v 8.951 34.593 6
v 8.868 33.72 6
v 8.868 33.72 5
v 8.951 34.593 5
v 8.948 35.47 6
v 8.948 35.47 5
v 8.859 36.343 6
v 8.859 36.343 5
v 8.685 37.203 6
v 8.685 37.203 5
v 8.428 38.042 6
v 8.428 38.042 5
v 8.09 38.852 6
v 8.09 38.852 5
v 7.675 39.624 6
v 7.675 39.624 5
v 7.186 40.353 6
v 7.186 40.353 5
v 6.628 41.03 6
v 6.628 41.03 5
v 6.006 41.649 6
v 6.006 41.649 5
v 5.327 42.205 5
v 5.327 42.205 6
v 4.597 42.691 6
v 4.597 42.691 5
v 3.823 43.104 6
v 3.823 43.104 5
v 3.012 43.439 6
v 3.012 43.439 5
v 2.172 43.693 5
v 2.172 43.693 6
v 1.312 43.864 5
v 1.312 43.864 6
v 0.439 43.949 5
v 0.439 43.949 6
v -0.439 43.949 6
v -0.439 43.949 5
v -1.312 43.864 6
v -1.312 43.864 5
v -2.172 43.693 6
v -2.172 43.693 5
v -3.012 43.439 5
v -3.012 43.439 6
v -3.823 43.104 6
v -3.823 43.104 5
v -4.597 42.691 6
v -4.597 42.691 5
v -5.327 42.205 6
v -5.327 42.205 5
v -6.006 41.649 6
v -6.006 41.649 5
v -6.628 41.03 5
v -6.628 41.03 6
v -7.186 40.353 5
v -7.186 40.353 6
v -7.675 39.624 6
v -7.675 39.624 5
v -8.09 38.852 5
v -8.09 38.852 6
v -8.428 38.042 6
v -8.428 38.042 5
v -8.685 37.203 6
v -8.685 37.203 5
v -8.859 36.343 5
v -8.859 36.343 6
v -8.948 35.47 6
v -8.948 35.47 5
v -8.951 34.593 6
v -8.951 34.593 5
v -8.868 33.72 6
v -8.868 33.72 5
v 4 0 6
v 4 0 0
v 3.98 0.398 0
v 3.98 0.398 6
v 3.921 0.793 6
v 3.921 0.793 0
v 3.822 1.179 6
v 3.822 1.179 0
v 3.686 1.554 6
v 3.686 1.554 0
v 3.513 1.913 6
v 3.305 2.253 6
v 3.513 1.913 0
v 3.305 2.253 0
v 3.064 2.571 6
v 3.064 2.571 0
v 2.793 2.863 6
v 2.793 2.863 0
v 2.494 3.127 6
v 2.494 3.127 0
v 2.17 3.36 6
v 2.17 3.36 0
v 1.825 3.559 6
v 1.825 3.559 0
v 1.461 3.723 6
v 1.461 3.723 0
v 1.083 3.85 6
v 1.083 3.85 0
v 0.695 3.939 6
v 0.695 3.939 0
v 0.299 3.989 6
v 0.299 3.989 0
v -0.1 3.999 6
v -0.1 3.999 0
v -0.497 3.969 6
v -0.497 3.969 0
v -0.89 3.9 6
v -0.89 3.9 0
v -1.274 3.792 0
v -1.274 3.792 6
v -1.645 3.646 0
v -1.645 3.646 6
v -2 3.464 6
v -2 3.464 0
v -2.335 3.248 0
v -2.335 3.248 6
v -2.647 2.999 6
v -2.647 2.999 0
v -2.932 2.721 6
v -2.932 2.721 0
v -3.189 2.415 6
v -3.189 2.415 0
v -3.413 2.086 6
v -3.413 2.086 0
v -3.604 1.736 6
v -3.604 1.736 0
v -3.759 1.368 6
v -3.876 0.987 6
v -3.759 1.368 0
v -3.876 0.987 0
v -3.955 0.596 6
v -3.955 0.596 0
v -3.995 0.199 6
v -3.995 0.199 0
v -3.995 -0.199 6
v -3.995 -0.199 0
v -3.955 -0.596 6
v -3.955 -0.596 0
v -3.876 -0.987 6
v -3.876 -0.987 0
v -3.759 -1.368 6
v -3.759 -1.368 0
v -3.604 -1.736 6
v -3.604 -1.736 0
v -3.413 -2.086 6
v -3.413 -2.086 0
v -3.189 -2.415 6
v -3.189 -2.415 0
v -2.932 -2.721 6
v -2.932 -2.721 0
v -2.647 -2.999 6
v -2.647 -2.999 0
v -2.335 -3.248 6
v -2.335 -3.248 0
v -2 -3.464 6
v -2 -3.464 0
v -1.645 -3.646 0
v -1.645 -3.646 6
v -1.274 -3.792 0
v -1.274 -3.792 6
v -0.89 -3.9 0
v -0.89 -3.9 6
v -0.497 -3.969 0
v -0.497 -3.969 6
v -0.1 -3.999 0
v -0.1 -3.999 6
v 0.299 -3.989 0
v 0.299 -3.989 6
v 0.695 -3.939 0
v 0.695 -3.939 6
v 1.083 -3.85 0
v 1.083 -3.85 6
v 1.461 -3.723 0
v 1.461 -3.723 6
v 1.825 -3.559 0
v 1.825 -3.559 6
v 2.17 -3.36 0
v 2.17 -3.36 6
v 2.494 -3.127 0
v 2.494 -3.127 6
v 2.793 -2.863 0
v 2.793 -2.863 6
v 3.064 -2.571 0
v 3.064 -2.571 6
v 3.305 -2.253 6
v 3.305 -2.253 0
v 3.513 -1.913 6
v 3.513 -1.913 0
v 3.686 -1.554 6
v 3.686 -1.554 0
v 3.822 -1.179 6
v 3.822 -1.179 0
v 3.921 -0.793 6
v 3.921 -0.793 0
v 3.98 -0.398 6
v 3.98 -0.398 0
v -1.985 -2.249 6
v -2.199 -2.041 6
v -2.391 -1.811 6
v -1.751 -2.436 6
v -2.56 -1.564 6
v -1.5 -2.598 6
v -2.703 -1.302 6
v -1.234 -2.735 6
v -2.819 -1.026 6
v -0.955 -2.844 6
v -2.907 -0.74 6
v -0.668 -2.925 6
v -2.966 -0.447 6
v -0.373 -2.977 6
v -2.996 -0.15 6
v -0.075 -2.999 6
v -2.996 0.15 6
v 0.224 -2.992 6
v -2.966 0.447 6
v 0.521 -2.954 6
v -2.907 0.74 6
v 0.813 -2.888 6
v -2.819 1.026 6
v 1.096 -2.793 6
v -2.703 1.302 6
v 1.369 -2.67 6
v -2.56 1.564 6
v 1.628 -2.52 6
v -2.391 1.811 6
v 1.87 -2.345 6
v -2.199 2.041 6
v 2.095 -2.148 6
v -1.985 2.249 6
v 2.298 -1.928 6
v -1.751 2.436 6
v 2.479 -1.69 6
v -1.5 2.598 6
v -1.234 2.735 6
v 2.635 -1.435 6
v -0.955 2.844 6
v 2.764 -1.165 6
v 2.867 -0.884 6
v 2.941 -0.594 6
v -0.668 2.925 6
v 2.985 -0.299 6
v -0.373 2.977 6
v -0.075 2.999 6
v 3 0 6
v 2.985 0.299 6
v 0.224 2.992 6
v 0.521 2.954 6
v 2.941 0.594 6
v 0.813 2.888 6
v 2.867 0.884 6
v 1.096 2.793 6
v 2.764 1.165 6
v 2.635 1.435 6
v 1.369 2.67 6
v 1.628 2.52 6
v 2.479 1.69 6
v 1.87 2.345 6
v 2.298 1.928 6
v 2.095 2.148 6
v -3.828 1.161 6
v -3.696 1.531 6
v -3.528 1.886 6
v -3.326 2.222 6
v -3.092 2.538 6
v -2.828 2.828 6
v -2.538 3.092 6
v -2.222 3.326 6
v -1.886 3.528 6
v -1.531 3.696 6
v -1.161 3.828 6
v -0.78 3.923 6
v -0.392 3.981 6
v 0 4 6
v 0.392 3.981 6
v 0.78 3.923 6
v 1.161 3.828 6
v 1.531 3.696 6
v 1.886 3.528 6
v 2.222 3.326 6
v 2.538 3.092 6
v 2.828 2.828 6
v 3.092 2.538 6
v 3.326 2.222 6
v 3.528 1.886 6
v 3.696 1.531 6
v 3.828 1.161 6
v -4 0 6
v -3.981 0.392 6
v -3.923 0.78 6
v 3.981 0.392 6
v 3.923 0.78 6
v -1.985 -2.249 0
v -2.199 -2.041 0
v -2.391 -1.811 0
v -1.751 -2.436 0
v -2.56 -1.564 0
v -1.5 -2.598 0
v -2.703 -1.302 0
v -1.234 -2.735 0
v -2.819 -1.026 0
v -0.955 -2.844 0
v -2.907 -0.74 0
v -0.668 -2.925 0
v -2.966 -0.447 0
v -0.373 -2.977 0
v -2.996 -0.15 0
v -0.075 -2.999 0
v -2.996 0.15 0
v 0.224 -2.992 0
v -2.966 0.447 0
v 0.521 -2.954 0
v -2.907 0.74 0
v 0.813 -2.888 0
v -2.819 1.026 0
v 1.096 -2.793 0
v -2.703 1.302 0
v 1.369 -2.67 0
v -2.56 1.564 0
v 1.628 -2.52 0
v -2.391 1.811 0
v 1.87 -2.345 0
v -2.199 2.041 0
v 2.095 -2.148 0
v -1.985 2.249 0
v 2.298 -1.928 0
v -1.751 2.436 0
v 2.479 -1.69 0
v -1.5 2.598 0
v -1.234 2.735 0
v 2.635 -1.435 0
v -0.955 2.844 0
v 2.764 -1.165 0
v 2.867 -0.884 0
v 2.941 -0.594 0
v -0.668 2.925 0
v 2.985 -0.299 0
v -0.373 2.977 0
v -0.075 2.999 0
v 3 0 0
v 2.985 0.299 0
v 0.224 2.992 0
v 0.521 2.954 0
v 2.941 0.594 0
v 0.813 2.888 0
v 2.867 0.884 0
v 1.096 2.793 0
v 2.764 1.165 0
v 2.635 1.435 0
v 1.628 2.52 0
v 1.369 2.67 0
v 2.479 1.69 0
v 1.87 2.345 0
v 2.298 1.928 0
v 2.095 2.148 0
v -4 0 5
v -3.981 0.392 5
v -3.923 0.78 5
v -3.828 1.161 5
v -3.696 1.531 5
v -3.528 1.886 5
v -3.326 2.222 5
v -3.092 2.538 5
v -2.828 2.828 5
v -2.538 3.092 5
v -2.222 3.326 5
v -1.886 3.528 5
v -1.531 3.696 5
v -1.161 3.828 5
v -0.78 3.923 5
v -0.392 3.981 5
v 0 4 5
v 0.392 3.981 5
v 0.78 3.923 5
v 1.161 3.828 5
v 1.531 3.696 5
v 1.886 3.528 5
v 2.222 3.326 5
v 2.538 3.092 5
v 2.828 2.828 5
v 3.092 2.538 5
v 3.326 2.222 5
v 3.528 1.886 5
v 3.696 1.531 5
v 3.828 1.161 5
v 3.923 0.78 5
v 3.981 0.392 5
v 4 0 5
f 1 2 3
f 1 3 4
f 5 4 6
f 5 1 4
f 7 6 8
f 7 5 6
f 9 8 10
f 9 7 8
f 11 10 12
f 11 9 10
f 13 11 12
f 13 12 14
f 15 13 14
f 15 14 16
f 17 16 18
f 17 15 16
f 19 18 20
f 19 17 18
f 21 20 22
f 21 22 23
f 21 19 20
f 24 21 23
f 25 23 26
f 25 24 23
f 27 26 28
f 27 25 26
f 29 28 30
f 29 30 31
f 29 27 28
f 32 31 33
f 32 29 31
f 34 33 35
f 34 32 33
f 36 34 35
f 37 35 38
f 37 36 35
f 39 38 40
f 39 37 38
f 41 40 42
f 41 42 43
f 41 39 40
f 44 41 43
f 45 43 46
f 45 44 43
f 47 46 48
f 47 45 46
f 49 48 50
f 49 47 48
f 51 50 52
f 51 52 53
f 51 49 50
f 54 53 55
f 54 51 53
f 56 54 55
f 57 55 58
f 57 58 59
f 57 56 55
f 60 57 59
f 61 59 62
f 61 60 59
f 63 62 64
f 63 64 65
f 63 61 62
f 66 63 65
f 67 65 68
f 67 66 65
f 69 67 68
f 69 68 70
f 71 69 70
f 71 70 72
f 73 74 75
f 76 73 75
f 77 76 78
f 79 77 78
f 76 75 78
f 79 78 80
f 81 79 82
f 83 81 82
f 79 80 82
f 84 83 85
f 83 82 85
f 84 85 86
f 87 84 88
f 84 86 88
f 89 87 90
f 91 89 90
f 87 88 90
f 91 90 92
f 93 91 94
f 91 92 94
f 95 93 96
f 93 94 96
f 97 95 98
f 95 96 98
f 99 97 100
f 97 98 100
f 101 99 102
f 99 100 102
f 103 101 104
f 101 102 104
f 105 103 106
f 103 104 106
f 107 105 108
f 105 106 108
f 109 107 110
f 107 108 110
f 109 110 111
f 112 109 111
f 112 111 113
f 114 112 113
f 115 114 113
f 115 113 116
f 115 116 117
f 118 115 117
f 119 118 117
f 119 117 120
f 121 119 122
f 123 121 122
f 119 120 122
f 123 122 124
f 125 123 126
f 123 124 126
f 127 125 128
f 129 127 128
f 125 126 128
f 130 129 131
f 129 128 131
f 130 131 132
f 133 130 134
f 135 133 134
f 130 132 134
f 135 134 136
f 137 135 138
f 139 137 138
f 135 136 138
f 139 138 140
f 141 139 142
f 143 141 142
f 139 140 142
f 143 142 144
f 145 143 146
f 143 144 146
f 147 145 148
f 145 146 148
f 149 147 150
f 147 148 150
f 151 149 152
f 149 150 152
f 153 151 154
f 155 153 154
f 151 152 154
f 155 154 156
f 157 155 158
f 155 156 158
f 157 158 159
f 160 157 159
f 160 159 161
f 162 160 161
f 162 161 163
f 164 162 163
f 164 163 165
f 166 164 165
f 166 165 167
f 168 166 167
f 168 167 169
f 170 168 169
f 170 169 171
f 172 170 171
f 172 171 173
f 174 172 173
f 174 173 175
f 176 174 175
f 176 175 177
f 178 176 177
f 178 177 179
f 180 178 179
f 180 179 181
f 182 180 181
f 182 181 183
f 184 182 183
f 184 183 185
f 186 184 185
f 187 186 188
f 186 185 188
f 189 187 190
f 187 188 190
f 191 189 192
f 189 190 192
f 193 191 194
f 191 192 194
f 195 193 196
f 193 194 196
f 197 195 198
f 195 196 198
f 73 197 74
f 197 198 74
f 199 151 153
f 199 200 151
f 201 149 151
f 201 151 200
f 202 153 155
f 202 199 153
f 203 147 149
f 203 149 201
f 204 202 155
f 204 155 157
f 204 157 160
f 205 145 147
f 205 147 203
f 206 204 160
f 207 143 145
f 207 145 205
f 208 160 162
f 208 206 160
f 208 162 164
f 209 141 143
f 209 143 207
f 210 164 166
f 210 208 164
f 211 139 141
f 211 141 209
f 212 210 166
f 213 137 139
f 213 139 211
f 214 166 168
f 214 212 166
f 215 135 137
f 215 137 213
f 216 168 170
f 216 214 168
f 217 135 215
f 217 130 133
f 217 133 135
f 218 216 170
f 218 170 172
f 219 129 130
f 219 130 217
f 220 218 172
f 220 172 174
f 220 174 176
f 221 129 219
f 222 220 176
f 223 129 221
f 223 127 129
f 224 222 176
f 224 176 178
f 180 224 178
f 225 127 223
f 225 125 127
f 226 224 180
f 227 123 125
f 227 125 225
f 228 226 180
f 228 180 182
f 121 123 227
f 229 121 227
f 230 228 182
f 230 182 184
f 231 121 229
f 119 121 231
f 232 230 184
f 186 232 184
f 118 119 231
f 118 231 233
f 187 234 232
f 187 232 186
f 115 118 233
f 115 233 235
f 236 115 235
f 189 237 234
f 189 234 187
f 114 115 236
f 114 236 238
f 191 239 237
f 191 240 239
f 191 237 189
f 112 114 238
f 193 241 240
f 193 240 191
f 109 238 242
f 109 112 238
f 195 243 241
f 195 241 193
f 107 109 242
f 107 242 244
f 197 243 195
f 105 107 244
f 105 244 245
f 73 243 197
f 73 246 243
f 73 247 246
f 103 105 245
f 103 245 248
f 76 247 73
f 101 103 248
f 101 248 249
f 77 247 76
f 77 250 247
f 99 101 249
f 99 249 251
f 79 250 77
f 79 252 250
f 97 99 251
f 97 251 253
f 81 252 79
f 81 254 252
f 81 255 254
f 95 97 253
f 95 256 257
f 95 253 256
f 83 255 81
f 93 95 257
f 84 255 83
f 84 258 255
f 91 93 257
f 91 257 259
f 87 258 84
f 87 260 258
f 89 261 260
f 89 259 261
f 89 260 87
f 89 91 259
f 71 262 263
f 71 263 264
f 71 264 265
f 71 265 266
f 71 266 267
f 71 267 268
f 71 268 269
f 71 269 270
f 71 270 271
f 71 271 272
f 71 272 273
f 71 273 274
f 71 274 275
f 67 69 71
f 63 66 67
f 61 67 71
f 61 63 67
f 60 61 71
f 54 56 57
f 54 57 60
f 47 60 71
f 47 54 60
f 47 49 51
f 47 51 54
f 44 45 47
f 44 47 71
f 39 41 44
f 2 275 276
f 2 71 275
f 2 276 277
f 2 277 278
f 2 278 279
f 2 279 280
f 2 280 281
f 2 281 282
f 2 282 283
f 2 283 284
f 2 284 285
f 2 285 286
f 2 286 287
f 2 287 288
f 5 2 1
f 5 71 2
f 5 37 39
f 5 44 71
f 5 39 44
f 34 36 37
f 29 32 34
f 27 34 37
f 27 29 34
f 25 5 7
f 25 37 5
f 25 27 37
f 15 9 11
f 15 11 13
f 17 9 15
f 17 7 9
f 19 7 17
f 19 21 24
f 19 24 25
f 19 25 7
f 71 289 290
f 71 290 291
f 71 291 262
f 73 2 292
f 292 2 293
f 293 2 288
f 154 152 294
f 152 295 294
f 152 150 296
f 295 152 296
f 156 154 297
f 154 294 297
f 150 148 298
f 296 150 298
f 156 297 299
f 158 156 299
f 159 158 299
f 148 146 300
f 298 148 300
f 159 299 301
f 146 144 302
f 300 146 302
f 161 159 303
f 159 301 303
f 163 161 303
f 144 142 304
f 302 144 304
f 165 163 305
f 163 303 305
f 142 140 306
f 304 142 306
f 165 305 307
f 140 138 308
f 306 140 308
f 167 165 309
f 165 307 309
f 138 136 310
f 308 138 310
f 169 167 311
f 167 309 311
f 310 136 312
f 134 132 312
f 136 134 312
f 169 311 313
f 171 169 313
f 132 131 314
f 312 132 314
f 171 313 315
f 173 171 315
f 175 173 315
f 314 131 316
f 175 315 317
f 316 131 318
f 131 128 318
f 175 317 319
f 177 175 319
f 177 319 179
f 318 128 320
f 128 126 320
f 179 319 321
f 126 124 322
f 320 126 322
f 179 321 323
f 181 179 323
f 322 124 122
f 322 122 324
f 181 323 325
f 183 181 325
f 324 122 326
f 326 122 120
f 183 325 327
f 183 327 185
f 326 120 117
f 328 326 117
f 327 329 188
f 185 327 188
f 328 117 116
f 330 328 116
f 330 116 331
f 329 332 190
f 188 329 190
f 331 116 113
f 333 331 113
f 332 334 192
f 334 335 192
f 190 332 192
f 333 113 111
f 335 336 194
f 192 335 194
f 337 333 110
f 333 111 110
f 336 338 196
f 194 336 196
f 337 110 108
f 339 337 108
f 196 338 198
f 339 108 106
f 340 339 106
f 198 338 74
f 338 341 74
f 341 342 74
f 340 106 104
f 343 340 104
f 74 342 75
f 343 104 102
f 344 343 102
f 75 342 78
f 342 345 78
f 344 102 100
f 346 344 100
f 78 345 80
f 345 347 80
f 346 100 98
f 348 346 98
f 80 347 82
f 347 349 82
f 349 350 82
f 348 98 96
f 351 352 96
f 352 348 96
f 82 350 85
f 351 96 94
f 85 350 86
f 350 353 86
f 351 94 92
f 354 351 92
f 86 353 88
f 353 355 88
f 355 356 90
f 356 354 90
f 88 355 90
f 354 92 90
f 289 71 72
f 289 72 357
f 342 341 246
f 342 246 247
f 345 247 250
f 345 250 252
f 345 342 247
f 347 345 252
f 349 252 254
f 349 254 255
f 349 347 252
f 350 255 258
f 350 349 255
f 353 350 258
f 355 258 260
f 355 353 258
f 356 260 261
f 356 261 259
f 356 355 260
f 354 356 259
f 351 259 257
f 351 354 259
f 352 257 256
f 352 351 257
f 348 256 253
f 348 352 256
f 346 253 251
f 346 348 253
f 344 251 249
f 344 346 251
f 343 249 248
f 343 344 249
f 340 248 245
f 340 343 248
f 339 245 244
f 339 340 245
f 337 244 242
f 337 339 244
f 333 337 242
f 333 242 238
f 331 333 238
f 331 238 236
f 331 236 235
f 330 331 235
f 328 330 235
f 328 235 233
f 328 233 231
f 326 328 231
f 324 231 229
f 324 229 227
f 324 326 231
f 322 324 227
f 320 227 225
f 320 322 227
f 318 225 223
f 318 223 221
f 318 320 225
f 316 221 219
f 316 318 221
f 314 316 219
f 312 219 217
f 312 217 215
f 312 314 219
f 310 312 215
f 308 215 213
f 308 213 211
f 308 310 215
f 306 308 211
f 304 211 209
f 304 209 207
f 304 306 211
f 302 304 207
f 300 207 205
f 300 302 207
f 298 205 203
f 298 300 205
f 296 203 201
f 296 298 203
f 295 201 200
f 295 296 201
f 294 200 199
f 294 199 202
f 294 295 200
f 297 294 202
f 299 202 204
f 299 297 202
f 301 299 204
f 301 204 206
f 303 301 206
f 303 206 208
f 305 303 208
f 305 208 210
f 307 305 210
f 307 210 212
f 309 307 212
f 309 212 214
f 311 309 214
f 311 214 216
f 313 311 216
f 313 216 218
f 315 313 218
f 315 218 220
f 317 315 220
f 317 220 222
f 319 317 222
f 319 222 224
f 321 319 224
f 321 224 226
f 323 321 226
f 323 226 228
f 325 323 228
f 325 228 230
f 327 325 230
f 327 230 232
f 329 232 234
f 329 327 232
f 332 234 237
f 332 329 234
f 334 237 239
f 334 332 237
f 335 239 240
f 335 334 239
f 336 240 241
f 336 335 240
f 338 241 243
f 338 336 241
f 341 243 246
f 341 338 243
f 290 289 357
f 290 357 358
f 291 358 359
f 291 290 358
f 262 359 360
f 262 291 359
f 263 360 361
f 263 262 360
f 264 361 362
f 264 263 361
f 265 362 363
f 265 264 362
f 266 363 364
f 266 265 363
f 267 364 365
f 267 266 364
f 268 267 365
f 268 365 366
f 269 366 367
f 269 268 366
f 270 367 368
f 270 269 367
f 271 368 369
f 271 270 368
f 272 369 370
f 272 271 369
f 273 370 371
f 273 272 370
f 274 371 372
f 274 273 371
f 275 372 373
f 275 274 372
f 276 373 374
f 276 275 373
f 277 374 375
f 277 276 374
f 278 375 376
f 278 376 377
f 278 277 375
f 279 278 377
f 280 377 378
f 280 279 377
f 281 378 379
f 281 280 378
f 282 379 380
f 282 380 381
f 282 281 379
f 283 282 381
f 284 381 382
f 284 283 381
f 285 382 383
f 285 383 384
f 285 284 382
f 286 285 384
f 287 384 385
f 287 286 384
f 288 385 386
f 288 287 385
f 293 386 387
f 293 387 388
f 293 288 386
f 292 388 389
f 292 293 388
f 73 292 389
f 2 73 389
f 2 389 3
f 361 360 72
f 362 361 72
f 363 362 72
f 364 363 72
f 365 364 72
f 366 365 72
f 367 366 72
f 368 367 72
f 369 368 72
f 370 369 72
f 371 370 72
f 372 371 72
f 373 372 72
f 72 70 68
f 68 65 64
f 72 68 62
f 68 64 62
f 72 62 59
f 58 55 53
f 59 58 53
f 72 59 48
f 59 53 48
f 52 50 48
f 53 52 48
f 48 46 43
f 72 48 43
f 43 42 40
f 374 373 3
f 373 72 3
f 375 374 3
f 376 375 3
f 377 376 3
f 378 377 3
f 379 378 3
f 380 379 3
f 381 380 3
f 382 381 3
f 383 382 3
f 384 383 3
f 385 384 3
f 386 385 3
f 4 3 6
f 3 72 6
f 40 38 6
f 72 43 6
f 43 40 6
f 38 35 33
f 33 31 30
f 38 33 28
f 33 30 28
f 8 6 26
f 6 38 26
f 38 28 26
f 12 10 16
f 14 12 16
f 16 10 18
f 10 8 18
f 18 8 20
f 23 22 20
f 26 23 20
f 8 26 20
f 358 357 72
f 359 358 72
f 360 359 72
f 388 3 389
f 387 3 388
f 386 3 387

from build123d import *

# Parameters (mm, degrees)
F0_R     = 4
F0_R_2   = 3
F1_DEPTH = 6
F3_DEPTH = 1


with BuildPart() as f1:
    # F0 (on Top) → F1 (new body)
    with BuildSketch(Plane.XY):
        Circle(F0_R)
        Circle(F0_R_2, mode=Mode.SUBTRACT)
    extrude(amount=F1_DEPTH)


with BuildPart() as f3:
    # F2 (on face) → F3 (new body)
    with BuildSketch(Plane.XY.offset(6)):
        with BuildLine():
            Line((-8.86817, 33.719687), (-4, 0))
            ThreePointArc((-4, 0), (0, 4), (4, 0))
            Line((4, 0), (8.86817, 33.719687))
            ThreePointArc((8.86817, 33.719687), (0, 43.960114), (-8.86817, 33.719687))
        make_face()
    extrude(amount=-F3_DEPTH)


solid = Compound([f1.part, f3.part])
